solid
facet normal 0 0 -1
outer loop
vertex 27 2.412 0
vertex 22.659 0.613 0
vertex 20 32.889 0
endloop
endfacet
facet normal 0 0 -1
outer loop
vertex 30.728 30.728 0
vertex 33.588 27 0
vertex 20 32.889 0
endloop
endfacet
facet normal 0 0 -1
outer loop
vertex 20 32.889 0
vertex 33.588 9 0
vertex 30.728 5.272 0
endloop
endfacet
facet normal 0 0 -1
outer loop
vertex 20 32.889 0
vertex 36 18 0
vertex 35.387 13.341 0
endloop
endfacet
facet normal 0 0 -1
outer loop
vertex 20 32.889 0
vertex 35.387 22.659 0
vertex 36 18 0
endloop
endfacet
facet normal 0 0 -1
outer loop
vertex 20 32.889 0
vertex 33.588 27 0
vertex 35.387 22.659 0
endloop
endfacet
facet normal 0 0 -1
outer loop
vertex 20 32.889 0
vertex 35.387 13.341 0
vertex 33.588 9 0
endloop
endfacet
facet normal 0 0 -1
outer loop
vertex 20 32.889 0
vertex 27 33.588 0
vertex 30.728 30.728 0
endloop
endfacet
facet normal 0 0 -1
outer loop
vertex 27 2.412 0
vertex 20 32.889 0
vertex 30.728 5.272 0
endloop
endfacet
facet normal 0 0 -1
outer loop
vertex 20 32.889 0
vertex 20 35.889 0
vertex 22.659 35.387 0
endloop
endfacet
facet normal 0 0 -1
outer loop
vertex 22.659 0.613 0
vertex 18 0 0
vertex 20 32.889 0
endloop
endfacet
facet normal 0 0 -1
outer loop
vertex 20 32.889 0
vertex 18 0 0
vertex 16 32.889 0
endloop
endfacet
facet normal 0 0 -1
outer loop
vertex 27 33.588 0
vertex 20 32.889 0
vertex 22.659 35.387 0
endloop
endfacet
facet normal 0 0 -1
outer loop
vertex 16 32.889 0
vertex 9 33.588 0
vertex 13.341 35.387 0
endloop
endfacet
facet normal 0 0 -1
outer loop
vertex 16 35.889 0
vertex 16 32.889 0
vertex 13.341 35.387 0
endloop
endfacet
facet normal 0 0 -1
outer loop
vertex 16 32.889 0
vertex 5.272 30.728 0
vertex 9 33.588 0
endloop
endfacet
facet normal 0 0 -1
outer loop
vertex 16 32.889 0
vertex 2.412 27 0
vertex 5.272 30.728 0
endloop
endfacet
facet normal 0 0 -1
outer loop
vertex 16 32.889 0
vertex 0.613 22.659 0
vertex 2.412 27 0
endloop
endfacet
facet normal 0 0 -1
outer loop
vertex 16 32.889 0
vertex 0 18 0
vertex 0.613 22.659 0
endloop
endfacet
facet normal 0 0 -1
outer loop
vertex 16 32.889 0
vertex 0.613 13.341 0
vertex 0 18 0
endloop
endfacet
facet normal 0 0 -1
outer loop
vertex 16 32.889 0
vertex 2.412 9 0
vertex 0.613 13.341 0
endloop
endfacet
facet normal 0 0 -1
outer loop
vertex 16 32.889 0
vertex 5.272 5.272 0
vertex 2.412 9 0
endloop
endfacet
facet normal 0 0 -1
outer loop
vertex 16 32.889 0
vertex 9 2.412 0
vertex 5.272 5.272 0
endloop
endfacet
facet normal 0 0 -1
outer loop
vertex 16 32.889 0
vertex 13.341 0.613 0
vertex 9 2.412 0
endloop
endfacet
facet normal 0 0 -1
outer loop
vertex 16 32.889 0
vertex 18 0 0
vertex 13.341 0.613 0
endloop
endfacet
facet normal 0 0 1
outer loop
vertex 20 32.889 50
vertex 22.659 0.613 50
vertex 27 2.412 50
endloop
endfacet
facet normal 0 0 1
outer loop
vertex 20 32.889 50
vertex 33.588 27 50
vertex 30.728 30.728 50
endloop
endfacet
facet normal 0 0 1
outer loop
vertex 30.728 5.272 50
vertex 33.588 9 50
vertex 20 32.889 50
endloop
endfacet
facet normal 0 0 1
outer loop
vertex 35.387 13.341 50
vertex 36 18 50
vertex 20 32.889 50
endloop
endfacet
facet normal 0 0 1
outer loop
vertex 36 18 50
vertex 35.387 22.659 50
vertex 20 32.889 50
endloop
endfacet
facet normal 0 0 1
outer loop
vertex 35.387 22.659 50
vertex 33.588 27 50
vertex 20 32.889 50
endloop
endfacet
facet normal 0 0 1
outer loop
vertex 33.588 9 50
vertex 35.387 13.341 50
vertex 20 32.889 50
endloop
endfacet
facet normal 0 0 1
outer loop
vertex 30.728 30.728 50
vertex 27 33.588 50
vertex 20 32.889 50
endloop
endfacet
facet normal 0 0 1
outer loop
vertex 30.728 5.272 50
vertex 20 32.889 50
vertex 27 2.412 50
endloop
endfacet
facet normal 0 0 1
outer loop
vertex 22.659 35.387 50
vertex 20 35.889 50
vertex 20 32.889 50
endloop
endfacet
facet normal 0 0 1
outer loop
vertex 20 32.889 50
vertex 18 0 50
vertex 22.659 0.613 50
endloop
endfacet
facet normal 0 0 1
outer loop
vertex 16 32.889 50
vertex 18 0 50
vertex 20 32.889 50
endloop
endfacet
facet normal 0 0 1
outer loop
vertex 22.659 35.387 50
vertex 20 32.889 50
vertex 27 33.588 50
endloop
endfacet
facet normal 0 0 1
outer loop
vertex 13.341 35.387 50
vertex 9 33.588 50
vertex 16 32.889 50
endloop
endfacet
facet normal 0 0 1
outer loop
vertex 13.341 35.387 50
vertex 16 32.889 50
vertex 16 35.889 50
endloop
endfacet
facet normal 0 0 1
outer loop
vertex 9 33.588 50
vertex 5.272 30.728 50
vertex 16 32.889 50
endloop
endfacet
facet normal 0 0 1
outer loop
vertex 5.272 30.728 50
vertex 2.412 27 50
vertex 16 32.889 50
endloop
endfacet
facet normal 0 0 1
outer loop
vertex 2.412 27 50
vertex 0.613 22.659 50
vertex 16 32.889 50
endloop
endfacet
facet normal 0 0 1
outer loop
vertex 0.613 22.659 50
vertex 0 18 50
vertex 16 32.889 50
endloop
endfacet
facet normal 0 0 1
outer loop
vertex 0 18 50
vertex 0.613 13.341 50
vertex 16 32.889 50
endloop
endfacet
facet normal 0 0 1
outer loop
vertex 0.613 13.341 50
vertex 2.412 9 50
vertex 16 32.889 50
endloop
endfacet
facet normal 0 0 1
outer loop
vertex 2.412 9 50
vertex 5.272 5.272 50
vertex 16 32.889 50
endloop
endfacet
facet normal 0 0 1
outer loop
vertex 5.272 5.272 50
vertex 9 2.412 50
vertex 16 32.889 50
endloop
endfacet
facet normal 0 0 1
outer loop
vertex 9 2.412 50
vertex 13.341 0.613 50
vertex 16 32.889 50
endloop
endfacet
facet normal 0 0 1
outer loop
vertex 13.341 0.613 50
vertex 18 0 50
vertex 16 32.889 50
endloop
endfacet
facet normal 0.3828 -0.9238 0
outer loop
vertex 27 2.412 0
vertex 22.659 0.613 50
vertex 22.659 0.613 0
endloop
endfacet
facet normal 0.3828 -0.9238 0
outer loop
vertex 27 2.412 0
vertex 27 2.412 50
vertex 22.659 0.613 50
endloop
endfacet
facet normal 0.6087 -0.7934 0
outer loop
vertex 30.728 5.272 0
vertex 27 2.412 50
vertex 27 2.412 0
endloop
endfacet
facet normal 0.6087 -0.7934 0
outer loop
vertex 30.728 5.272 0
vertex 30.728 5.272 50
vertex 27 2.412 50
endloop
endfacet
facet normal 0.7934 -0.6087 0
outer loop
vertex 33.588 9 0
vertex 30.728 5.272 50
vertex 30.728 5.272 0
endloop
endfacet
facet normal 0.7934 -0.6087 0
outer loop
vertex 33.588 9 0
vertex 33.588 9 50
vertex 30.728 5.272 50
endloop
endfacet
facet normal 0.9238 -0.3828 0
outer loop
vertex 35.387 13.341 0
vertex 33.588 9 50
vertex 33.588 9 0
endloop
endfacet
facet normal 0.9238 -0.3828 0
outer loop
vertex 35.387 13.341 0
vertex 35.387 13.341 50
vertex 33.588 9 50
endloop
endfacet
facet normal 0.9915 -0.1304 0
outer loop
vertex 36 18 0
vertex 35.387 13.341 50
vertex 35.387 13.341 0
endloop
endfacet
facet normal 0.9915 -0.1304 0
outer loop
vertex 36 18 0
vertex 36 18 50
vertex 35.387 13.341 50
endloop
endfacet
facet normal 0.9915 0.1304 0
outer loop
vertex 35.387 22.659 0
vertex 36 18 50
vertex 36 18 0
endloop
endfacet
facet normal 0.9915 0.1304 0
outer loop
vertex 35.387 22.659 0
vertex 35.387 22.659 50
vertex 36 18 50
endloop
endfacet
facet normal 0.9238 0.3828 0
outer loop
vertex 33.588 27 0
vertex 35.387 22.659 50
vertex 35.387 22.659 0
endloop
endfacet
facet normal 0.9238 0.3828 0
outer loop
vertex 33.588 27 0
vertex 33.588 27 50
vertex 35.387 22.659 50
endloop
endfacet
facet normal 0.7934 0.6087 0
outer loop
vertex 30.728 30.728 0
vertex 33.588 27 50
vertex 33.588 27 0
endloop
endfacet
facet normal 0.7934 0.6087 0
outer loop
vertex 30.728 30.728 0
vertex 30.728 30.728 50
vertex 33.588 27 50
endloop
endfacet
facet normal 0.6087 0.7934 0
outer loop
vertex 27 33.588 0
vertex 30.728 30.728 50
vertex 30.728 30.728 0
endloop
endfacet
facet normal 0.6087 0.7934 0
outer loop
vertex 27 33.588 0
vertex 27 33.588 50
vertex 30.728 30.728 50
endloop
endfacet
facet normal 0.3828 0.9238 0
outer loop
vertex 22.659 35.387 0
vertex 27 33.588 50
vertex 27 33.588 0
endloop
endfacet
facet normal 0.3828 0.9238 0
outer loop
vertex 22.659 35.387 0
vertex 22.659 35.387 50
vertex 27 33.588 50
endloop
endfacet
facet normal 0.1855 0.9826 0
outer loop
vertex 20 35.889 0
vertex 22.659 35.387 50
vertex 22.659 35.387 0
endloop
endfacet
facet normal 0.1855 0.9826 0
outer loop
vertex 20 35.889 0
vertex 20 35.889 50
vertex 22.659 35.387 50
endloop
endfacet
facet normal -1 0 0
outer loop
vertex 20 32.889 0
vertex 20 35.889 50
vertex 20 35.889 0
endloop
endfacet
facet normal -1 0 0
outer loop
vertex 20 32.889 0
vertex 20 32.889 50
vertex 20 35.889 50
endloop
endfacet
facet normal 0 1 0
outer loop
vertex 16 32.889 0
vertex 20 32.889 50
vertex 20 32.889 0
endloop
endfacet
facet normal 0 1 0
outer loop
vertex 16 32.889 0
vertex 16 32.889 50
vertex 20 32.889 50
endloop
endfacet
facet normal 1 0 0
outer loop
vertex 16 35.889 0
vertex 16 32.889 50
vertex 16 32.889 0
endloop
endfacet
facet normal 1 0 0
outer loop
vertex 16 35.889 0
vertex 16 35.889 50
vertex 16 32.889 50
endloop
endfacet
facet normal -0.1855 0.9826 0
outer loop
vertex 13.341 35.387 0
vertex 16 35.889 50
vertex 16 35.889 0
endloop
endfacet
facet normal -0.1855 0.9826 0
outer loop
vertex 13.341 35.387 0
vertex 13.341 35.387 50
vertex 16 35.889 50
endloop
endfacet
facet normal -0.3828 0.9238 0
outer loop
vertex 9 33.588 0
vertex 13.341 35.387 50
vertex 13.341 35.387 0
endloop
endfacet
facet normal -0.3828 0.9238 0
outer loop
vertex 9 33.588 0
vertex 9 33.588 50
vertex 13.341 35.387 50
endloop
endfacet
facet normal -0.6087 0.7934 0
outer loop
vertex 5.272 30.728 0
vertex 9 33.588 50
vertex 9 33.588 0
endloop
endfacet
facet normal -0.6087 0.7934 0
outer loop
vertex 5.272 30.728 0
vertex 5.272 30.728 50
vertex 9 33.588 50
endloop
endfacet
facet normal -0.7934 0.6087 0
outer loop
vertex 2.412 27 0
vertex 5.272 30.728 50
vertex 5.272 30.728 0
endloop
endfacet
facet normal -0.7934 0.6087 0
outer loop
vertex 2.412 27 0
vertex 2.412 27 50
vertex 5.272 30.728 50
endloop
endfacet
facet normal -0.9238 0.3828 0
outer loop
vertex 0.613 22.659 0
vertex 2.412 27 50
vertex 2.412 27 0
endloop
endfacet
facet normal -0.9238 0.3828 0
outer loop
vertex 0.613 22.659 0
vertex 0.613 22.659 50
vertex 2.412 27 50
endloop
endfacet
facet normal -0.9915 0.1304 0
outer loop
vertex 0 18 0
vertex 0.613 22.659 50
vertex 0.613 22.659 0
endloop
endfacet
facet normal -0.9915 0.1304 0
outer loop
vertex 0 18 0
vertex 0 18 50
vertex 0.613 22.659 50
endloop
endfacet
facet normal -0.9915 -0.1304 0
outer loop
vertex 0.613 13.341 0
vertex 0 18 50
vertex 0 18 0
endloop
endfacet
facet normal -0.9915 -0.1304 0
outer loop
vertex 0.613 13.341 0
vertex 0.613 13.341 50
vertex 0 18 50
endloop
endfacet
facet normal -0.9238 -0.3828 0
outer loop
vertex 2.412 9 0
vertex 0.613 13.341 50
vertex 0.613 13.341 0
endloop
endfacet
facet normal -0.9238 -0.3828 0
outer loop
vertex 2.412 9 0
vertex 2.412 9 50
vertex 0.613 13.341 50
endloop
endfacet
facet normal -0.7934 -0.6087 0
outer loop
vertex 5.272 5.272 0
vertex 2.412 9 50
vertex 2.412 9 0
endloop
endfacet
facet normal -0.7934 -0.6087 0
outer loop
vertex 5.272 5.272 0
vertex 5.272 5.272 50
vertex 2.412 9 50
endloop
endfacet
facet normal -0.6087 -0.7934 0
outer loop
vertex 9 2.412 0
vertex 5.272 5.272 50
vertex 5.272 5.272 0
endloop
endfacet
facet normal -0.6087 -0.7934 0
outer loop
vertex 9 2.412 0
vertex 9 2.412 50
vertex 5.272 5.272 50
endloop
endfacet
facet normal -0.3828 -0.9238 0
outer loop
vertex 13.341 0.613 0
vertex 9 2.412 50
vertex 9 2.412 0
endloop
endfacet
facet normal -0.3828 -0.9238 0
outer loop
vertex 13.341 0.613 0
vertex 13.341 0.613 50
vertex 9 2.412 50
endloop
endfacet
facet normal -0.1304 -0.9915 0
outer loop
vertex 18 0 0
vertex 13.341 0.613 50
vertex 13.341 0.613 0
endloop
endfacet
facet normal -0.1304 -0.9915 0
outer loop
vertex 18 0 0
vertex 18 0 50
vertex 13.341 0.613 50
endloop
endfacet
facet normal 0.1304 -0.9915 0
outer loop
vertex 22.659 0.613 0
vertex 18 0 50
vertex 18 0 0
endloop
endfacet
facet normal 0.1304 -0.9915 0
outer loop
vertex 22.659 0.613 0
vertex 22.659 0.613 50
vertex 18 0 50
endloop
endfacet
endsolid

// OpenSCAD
$fn = 32;

// ----------------------------------------------------------------------
// Keyway shaft: d36 shaft, key 4 x 3 mm
// ----------------------------------------------------------------------

// --- parameters (mm) ---
shaft_r = 18;             // shaft radius
key_w = 4;                // keyway width
key_d = 3;                // keyway depth below the surface line
plate_t = 50;             // shaft length, Z (extrusion height)

shaft_d = 2 * shaft_r;  // shaft diameter
circle_step = 15;  // polygon sampling step, degrees

profile = [[13.341, 35.387], [9, 33.588], [5.272, 30.728], [2.412, 27], [0.613, 22.659], [0, 18], [0.613, 13.341], [2.412, 9], [5.272, 5.272], [9, 2.412], [13.341, 0.613], [18, 0], [22.659, 0.613], [27, 2.412], [30.728, 5.272], [33.588, 9], [35.387, 13.341], [36, 18], [35.387, 22.659], [33.588, 27], [30.728, 30.728], [27, 33.588], [22.659, 35.387], [20, 35.889], [20, 32.889], [16, 32.889], [16, 35.889]];  // primary outline, 27 points, counter clockwise

// --- the one profile operation ---
linear_extrude(height = plate_t) polygon(points = profile);
